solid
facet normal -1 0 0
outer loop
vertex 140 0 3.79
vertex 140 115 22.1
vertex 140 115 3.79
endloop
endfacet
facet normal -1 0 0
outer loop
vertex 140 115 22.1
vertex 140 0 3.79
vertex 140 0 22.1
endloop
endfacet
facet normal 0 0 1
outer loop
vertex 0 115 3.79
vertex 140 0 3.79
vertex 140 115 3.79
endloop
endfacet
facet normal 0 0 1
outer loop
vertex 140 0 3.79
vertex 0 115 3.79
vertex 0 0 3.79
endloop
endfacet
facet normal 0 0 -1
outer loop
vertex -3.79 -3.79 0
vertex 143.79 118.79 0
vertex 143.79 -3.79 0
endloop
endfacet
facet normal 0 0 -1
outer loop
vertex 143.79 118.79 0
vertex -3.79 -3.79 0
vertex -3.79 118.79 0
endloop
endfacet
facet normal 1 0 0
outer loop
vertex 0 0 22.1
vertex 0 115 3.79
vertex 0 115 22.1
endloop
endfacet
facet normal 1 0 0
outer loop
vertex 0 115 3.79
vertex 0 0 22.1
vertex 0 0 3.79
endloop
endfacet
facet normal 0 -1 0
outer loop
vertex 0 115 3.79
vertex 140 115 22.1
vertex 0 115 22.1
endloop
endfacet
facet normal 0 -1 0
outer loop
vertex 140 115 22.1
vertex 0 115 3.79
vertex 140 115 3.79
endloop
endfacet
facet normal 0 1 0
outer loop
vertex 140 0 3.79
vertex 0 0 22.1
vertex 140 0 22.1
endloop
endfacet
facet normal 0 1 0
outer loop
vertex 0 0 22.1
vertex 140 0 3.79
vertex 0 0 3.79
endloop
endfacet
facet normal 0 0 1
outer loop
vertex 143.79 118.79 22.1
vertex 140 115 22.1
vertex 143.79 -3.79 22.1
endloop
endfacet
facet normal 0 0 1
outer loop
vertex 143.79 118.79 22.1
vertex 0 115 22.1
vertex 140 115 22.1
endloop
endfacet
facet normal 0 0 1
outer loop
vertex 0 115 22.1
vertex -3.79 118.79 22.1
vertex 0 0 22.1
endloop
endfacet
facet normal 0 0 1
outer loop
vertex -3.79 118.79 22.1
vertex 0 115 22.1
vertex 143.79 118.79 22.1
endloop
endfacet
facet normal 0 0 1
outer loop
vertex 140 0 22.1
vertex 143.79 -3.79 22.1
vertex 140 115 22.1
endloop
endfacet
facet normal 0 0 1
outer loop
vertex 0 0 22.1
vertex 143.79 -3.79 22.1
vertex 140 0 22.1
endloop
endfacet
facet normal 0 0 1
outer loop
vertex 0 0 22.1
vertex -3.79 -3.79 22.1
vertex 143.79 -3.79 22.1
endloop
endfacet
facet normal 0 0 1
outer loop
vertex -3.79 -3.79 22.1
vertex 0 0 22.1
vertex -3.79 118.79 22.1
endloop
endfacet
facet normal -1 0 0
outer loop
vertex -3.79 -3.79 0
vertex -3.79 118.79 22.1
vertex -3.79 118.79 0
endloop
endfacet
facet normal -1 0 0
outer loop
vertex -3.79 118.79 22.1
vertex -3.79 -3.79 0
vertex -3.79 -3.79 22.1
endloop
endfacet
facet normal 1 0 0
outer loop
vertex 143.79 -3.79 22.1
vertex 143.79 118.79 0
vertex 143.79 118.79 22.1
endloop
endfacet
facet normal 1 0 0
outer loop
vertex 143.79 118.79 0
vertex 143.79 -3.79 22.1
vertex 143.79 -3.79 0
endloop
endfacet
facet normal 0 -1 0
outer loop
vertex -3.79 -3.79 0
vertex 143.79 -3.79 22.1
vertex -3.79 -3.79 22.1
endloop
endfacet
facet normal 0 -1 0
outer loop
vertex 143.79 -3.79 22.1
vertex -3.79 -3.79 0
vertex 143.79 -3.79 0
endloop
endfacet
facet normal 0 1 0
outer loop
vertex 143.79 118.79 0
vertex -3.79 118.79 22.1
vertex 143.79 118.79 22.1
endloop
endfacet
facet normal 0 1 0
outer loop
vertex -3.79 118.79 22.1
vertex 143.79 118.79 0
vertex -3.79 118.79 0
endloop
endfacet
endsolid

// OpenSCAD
//14*11.5

//Dilbert
w=140;
d=115;
t=3.79;
h=22.1;
echo(h);
v=h*2;



//translate([0,0,0])
module 
dilbert() {

cube([w,d,t]);

translate([-t,0,0])
cube([t,d,h]);

translate([w,0,0])
cube([t,d,h]);

translate([-t,-t,0])
cube([w+t+t,t,h]);

translate([-t,d,0])
cube([w+t+t,t,h]);
}

dilbert();

//translate([0,v,h])
//dilbert();
